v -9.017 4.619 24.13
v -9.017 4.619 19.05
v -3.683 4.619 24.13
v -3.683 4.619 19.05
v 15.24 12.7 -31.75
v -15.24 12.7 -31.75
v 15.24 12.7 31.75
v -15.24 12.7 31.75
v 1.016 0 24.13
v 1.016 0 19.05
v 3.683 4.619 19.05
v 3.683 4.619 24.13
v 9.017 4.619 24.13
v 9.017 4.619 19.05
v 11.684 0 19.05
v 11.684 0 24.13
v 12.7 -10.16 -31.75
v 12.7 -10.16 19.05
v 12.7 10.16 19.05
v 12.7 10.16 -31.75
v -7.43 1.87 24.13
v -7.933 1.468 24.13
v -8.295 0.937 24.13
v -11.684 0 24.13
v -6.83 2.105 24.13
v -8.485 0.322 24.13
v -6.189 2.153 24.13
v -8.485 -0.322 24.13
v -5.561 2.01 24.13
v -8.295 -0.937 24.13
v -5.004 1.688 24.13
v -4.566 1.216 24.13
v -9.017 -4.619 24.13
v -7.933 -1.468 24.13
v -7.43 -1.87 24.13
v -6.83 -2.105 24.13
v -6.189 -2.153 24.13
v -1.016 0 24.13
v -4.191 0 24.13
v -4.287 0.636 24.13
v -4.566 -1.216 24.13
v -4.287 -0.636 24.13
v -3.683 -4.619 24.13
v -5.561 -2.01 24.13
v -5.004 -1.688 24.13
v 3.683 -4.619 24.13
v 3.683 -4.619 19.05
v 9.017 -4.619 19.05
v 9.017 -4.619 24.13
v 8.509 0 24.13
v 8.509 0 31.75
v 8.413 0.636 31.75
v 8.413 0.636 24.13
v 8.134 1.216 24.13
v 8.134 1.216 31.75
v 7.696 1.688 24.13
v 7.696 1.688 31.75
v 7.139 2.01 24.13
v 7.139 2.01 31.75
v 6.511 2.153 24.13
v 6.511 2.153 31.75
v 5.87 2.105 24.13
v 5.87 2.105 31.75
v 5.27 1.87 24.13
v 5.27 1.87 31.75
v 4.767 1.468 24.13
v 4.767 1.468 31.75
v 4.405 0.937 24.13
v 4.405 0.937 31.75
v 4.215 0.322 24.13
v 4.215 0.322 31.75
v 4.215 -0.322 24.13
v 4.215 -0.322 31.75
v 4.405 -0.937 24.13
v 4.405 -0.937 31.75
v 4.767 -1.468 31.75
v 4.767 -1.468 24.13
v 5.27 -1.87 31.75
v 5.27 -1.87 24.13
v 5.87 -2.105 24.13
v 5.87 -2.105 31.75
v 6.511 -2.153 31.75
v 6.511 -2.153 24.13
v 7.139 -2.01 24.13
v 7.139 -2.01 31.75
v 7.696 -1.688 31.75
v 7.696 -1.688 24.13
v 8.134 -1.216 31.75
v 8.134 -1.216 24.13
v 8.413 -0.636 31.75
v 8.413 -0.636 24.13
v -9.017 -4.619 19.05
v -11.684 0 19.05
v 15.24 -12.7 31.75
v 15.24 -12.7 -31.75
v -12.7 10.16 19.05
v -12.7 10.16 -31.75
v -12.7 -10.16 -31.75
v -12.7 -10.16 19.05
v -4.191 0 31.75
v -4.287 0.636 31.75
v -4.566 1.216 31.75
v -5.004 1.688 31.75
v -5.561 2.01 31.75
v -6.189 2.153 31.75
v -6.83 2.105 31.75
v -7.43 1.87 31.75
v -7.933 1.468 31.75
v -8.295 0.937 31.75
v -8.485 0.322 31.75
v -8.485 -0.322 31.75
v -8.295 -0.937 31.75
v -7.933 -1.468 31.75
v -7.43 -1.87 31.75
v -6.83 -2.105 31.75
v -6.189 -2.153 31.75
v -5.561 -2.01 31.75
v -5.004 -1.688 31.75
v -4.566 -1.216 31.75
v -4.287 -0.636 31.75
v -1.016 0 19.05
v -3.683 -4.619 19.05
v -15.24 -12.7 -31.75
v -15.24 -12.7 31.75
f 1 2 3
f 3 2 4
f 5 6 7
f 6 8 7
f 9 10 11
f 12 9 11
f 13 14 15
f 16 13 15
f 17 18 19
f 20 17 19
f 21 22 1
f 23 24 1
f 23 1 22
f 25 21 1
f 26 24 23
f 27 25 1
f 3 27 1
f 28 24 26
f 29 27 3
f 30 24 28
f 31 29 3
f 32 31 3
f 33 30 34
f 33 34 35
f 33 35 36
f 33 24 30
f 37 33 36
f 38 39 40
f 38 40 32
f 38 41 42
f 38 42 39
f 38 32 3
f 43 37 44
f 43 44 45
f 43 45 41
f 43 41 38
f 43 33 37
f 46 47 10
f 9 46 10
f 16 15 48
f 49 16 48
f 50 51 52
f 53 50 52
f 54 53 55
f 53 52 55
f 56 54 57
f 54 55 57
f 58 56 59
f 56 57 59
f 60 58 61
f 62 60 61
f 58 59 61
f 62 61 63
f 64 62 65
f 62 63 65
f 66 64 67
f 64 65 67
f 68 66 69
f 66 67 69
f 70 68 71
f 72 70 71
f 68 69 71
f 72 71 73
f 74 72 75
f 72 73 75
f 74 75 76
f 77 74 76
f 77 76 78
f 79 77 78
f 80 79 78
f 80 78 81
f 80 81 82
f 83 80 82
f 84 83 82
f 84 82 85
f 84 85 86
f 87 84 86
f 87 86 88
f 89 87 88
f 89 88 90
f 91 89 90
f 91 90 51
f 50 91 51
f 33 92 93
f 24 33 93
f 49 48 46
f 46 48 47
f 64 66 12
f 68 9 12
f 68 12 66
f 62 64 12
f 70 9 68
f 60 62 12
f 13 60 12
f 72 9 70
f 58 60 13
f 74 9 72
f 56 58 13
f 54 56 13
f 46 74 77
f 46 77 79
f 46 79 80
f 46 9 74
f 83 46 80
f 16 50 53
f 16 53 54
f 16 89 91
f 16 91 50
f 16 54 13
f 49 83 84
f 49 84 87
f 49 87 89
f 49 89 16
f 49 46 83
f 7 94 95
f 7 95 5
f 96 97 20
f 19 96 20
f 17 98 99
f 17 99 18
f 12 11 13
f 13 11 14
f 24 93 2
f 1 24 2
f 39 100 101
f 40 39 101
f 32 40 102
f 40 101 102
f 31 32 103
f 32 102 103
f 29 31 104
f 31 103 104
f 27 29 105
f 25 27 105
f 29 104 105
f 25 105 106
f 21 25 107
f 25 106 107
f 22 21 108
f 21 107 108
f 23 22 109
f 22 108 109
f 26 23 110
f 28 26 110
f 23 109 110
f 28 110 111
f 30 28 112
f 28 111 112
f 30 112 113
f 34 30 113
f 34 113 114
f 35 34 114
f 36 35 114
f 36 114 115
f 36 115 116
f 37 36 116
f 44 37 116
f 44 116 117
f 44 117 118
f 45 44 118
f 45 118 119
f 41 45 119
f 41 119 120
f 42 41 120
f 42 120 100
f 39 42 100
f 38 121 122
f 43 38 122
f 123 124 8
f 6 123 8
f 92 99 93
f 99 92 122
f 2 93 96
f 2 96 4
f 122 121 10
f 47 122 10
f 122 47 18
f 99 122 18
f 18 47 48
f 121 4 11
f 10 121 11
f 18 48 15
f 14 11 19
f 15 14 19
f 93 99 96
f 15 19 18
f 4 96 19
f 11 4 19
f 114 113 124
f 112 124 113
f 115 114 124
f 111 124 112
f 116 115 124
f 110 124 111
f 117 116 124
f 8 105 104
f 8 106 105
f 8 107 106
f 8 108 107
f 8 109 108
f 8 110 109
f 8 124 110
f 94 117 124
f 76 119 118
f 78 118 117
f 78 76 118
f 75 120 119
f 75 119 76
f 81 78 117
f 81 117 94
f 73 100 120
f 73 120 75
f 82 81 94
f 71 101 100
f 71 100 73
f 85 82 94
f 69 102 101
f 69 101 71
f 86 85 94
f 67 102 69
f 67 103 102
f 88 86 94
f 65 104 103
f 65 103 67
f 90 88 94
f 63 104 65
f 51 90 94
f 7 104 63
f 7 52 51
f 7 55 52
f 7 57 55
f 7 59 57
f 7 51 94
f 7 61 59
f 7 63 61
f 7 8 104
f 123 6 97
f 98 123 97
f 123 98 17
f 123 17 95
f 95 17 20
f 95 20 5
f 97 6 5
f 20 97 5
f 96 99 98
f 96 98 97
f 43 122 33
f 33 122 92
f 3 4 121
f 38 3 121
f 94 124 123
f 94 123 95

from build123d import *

# Parameters (mm, degrees)
F0_W     = 30.48
F0_H     = 25.4
F0_W_2   = 25.4
F0_H_2   = 20.32
F1_DEPTH = 31.75
F2_W     = 25.4
F2_H     = 20.32
F2_W_2   = 20.32
F2_H_2   = 15.24
F2_R     = 2.159
F3_DEPTH = 12.7
F4_R     = 2.159
F5_DEPTH = 5.08


with BuildPart() as f1:
    # F0 (on Top) → F1 (new body, symmetric)
    with BuildSketch(Plane.XY):
        Rectangle(F0_W, F0_H)
        Rectangle(F0_W_2, F0_H_2, mode=Mode.SUBTRACT)
    extrude(amount=F1_DEPTH, both=True)

    # F2 (on face) → F3 (join)
    with BuildSketch(Plane.XY.offset(31.75)):
        Rectangle(F2_W, F2_H)
        Rectangle(F2_W_2, F2_H_2, mode=Mode.SUBTRACT)
        Rectangle(F2_W_2, F2_H_2)
        with Locations((-6.35, 0)):
            Circle(F2_R, mode=Mode.SUBTRACT)
        with Locations((6.35, 0)):
            Circle(F2_R, mode=Mode.SUBTRACT)
    extrude(amount=-F3_DEPTH)

    # F4 (on face) → F5 (cut)
    with BuildSketch(Plane(origin=(0, 0, 19.05), x_dir=(1, 0, 0), z_dir=(0, 0, -1))):
        Polygon((-3.683, 4.6193795038), (-9.017, 4.6193795038), (-11.684, 0), (-9.017, -4.6193795038), (-3.683, -4.6193795038), (-1.016, 0), align=None)
        with Locations((-6.35, 0)):
            Circle(F4_R, mode=Mode.SUBTRACT)
        Polygon((9.017, 4.6193795038), (3.683, 4.6193795038), (1.016, 0), (3.683, -4.6193795038), (9.017, -4.6193795038), (11.684, 0), align=None)
        with Locations((6.35, 0)):
            Circle(F4_R, mode=Mode.SUBTRACT)
        with Locations((-6.35, 0)):
            Circle(F4_R)
        with Locations((6.35, 0)):
            Circle(F4_R)
    extrude(amount=-F5_DEPTH, mode=Mode.SUBTRACT)


solid = f1.part
